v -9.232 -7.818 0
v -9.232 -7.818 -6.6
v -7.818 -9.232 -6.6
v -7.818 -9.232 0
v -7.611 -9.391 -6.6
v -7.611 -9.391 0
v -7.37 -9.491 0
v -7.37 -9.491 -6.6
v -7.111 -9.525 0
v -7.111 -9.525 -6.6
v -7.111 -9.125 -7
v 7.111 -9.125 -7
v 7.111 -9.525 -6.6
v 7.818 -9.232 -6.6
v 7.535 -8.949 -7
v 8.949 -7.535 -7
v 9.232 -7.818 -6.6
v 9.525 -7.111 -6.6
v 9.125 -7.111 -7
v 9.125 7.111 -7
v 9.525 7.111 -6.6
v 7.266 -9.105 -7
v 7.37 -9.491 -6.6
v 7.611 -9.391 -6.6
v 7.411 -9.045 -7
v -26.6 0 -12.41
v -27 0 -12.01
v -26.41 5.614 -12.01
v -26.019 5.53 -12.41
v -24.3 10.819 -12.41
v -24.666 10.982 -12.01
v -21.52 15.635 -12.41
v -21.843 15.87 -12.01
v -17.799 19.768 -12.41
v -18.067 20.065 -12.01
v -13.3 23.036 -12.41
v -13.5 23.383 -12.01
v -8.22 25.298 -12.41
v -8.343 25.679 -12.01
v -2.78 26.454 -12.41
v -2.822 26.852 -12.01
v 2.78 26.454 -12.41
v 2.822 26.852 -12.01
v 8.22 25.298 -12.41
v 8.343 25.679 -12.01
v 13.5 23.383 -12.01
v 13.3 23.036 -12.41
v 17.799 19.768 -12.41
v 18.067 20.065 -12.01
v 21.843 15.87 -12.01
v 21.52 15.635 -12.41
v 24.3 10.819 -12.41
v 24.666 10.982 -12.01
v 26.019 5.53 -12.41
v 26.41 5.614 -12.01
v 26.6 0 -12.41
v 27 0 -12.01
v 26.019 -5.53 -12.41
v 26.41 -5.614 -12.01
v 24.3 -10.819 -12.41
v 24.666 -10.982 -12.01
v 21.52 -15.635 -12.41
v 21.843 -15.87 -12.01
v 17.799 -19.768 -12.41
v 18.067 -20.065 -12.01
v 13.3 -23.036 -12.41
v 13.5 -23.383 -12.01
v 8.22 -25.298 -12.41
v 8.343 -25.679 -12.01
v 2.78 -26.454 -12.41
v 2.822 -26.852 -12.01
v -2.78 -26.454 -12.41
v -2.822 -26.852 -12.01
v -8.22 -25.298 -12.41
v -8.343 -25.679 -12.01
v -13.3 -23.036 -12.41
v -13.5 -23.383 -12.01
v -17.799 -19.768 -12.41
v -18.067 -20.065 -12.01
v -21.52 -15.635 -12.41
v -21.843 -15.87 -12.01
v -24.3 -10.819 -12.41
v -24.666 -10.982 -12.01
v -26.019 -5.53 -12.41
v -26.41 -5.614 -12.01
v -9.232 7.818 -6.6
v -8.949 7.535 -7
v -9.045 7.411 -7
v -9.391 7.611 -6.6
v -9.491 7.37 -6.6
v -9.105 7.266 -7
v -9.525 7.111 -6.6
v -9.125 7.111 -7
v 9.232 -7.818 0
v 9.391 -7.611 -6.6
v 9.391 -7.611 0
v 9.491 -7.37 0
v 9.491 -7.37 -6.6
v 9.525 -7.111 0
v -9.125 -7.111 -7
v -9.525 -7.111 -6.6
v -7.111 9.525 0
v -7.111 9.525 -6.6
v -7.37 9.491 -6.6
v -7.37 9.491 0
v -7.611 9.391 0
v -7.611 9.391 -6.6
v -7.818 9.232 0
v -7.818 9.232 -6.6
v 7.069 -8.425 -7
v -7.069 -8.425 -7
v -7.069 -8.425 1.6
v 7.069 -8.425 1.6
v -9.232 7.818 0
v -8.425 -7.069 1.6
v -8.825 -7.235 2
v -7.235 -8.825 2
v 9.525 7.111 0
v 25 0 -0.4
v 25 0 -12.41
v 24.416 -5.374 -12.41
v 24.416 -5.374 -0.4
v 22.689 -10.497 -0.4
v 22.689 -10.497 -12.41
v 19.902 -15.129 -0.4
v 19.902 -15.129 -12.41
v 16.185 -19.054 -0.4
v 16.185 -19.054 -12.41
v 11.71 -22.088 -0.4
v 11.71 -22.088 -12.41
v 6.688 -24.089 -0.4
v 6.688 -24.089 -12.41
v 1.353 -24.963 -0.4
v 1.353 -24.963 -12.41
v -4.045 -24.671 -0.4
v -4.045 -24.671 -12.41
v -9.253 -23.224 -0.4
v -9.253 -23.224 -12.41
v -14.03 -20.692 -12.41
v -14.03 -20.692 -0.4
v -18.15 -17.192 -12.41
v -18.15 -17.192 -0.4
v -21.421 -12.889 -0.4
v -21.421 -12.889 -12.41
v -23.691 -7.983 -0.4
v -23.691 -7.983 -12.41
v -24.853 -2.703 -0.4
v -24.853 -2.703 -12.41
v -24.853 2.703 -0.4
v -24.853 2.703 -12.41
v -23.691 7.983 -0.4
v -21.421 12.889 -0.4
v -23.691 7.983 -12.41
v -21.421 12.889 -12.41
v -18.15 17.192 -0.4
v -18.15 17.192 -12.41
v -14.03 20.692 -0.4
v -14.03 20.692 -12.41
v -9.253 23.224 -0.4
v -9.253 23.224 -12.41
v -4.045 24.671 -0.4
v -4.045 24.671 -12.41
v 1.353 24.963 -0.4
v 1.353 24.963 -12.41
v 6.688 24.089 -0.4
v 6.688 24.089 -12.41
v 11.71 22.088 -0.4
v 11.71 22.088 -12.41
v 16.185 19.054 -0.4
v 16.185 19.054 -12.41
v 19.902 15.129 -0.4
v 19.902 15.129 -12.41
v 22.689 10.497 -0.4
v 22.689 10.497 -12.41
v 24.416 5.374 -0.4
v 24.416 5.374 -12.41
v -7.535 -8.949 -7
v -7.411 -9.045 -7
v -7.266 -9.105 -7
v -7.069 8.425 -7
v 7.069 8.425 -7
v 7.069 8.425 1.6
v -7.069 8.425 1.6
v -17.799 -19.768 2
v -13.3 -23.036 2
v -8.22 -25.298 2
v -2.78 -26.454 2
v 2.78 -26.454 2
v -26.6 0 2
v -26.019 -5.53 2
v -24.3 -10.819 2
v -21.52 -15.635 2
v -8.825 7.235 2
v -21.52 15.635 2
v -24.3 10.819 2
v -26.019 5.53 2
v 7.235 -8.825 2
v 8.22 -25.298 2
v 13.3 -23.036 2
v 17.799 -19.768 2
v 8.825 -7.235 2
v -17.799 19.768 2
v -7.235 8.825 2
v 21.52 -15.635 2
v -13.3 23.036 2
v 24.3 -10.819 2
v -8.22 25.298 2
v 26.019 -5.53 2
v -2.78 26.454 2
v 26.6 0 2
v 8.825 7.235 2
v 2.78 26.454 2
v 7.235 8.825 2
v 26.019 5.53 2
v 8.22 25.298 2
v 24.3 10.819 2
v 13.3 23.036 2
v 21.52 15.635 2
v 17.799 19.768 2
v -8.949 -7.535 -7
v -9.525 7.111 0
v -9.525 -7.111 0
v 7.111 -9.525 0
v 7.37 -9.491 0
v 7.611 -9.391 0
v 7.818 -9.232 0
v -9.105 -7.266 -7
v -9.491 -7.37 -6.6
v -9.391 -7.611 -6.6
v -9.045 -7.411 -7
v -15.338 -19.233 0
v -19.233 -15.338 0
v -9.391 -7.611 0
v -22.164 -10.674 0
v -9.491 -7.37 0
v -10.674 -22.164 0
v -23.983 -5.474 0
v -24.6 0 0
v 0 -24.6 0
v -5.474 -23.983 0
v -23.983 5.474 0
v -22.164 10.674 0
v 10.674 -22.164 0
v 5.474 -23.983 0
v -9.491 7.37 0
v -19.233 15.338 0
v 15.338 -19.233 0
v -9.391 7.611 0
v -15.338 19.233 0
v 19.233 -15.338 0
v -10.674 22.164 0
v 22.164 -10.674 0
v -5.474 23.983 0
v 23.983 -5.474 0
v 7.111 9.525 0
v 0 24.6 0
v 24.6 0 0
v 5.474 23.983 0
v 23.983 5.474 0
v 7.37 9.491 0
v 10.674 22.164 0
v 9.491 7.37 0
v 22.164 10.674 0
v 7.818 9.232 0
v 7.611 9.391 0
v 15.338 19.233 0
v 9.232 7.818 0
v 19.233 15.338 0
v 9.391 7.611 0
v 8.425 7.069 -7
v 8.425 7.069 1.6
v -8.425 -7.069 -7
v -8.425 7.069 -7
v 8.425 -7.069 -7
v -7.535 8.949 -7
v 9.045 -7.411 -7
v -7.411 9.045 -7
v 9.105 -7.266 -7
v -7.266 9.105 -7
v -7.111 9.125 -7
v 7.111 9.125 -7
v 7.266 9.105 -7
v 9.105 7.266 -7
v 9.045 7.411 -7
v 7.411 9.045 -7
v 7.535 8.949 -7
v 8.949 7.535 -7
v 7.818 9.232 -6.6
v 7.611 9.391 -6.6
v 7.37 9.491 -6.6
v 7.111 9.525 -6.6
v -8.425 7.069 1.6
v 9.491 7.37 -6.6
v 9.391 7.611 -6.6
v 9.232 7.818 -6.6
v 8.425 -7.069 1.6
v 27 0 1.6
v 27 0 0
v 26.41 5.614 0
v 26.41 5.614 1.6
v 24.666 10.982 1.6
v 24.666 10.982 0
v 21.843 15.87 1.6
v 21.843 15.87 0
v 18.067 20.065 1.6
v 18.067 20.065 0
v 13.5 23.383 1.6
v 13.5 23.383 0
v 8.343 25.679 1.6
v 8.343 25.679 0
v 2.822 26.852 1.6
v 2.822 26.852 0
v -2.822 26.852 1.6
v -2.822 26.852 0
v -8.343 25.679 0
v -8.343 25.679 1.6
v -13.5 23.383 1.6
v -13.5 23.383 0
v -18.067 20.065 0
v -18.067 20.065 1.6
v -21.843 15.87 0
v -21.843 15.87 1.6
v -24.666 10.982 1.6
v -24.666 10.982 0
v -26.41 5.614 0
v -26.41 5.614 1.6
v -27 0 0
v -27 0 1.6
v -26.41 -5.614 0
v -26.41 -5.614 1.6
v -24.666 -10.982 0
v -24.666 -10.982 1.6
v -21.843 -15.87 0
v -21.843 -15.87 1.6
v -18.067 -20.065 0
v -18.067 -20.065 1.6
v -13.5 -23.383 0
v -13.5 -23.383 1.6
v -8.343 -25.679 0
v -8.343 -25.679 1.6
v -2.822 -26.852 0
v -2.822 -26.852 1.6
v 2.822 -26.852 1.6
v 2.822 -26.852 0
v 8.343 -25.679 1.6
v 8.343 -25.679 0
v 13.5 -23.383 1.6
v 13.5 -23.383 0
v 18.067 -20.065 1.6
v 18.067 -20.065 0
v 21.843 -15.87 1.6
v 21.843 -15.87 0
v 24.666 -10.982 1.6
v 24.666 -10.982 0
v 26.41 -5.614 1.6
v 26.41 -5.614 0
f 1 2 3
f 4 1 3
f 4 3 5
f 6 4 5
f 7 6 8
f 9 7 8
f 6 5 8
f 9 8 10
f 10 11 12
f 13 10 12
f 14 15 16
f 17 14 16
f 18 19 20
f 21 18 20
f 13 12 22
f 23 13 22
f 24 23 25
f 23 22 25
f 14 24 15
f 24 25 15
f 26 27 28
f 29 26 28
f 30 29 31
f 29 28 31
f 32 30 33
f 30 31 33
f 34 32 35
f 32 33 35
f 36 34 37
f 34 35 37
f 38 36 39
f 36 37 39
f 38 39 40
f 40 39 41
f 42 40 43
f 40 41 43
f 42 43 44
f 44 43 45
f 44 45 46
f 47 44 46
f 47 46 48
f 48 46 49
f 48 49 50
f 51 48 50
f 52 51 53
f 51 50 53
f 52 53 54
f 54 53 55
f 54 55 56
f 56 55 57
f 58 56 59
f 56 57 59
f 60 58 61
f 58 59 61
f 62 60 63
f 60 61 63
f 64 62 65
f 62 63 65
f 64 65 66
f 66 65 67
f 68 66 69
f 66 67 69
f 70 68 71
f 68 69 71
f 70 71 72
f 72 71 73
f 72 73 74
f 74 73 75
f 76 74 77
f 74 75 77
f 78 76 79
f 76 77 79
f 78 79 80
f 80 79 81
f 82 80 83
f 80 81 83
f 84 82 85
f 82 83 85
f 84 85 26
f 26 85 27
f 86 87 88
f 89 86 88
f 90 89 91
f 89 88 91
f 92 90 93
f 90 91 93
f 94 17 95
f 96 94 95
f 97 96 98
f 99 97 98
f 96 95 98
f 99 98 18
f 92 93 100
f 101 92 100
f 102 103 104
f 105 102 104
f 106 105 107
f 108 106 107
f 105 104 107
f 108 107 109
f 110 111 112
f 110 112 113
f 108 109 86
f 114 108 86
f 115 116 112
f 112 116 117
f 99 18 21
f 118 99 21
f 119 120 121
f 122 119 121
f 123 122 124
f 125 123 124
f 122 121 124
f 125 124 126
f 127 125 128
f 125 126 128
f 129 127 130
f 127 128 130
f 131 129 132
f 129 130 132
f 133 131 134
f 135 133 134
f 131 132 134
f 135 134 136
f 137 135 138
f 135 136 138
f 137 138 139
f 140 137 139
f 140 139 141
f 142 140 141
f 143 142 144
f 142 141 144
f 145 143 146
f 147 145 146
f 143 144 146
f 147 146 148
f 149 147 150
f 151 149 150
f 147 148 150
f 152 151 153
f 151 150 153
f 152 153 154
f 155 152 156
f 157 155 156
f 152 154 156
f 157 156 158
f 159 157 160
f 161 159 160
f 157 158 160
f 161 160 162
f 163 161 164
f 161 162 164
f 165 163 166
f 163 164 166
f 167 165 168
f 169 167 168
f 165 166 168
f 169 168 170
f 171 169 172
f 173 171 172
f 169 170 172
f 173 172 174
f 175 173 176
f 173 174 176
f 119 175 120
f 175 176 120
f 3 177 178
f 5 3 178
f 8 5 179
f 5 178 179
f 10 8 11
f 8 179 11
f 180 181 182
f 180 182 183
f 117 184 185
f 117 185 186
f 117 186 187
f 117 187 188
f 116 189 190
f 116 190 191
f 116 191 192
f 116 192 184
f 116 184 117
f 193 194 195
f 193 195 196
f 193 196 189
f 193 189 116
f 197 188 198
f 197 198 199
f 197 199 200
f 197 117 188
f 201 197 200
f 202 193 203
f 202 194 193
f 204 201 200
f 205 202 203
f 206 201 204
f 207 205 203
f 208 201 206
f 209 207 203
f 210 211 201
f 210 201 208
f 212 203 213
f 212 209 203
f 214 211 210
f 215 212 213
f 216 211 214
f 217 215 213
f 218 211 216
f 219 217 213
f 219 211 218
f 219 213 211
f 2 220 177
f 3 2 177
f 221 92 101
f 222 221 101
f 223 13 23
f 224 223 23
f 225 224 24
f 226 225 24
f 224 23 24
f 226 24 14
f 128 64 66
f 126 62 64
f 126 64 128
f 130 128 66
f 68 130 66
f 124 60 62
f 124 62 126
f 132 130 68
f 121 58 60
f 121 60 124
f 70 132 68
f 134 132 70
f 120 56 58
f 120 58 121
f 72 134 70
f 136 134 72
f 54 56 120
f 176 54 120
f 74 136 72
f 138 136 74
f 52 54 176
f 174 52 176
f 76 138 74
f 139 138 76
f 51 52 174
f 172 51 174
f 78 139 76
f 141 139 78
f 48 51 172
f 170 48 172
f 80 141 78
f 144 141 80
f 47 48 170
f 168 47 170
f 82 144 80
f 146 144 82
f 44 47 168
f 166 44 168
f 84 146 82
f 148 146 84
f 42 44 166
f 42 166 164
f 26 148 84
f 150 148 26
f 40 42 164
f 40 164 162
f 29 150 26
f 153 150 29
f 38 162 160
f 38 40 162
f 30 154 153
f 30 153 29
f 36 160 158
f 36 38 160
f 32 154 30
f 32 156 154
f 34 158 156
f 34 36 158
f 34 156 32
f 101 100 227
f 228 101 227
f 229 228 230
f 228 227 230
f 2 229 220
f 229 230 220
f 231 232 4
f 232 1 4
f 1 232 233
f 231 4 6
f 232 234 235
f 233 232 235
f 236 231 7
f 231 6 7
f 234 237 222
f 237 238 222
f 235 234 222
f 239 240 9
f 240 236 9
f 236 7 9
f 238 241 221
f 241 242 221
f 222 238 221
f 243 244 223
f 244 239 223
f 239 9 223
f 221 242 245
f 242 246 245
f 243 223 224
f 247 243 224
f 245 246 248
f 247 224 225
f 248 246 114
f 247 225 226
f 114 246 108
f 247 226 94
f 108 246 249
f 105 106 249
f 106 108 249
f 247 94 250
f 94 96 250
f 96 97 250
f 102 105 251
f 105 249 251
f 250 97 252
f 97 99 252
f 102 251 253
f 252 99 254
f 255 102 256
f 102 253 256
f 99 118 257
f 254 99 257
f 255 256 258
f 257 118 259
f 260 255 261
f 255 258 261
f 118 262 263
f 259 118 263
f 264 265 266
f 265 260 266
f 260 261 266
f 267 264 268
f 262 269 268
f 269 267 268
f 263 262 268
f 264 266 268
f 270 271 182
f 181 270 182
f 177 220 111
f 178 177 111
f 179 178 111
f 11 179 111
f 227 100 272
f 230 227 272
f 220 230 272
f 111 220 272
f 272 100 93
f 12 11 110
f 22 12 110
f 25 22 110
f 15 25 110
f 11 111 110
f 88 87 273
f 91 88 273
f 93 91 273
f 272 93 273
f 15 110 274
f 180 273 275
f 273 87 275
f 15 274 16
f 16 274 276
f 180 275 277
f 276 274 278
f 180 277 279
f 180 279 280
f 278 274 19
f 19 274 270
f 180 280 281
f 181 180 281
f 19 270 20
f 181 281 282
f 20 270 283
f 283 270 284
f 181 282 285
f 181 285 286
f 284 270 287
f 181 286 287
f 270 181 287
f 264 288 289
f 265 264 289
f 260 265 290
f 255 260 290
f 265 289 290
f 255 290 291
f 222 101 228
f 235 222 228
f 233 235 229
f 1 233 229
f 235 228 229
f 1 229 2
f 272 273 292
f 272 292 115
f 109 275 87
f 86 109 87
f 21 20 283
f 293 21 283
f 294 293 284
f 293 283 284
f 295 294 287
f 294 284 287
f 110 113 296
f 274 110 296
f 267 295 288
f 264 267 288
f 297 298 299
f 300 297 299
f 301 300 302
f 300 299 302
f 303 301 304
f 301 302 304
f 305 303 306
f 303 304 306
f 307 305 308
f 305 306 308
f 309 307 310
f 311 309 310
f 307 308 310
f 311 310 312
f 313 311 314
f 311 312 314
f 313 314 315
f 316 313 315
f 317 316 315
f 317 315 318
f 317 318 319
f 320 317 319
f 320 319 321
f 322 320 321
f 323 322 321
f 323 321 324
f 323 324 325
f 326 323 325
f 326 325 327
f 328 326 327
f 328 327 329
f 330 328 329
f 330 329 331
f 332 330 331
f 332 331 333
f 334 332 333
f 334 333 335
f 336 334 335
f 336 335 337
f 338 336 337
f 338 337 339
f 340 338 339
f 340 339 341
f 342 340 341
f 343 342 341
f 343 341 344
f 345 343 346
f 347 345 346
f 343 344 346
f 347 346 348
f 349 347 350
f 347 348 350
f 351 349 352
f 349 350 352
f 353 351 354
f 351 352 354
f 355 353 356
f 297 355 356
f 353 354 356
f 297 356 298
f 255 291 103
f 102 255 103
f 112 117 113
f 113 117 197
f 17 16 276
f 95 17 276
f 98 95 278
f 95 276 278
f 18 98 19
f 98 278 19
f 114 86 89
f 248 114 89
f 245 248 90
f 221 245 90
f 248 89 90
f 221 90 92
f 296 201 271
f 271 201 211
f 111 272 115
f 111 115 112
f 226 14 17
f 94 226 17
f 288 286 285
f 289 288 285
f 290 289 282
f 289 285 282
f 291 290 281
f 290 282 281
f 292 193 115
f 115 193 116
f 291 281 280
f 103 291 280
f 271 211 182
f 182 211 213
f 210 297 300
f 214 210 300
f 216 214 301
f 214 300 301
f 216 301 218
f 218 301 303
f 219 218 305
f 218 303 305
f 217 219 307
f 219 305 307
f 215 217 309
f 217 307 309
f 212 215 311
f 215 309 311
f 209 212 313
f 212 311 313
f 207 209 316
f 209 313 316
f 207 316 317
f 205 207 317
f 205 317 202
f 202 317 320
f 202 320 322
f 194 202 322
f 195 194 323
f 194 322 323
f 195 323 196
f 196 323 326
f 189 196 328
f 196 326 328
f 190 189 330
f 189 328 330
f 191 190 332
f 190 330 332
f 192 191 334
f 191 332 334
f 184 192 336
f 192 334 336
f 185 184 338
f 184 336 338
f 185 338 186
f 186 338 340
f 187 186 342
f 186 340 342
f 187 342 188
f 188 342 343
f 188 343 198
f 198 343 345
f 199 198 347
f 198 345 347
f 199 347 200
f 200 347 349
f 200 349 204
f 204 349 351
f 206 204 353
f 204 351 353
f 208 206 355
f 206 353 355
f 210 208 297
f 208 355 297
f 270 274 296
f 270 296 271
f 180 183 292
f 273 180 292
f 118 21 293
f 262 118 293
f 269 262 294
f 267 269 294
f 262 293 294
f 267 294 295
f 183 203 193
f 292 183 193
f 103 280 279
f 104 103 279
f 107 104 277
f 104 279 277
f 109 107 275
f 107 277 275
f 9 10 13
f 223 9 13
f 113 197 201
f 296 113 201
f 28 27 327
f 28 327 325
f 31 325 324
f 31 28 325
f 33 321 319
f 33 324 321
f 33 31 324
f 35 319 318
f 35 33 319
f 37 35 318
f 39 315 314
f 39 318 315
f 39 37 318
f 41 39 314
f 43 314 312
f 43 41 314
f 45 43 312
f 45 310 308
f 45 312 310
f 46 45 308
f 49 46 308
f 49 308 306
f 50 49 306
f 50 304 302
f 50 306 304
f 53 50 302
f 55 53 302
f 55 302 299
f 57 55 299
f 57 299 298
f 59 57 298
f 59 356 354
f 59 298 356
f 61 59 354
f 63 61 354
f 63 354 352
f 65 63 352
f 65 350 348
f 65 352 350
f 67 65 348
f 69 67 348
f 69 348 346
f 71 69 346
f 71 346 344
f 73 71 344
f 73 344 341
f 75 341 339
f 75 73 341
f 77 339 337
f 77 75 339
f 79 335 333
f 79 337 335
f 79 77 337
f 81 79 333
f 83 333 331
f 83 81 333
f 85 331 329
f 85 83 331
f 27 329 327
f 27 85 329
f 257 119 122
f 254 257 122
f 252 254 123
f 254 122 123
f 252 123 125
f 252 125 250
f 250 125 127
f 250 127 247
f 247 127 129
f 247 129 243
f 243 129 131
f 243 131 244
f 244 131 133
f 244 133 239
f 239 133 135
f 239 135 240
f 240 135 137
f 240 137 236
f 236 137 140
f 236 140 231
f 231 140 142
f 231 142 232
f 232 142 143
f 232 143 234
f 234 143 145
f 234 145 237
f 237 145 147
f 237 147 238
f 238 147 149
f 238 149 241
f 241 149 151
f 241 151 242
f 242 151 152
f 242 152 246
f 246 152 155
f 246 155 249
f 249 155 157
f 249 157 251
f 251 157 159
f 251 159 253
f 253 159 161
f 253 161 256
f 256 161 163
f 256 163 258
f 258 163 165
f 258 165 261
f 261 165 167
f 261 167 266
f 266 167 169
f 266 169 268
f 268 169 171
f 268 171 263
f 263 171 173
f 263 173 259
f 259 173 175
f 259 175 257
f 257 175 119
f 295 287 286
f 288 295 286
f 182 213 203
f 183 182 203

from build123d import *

# Parameters (mm, degrees)
SKETCH1_R           = 27
BOSS_EXTRUDE1_DEPTH = 2
BOSS_EXTRUDE2_START = 12.41
SKETCH2_R           = 27
SKETCH2_R_2         = 25
BOSS_EXTRUDE2_DEPTH = 12.41
BOSS_EXTRUDE3_START = -9
BOSS_EXTRUDE3_DEPTH = 9
CHAMFER1_SIZE       = 0.4


with BuildPart() as part:
    # Sketch1 → Boss-Extrude1 (new body)
    with BuildSketch(Plane.XY):
        Circle(SKETCH1_R)
        with BuildLine():
            Line((-9.232106781, -7.817893219), (-7.817893219, -9.232106781))
            ThreePointArc((-7.817893219, -9.232106781), (-7.49346987, -9.448879533), (-7.110786438, -9.525))
            Line((-7.110786438, -9.525), (7.110786438, -9.525))
            ThreePointArc((7.110786438, -9.525), (7.49346987, -9.448879533), (7.817893219, -9.232106781))
            Line((7.817893219, -9.232106781), (9.232106781, -7.817893219))
            ThreePointArc((9.232106781, -7.817893219), (9.448879533, -7.49346987), (9.525, -7.110786438))
            Line((9.525, -7.110786438), (9.525, 7.110786438))
            ThreePointArc((9.525, 7.110786438), (9.448879533, 7.49346987), (9.232106781, 7.817893219))
            Line((9.232106781, 7.817893219), (7.817893219, 9.232106781))
            ThreePointArc((7.817893219, 9.232106781), (7.49346987, 9.448879533), (7.110786438, 9.525))
            Line((7.110786438, 9.525), (-7.110786438, 9.525))
            ThreePointArc((-7.110786438, 9.525), (-7.49346987, 9.448879533), (-7.817893219, 9.232106781))
            Line((-7.817893219, 9.232106781), (-9.232106781, 7.817893219))
            ThreePointArc((-9.232106781, 7.817893219), (-9.448879533, 7.49346987), (-9.525, 7.110786438))
            Line((-9.525, 7.110786438), (-9.525, -7.110786438))
            ThreePointArc((-9.525, -7.110786438), (-9.448879533, -7.49346987), (-9.232106781, -7.817893219))
        make_face(mode=Mode.SUBTRACT)
    extrude(amount=BOSS_EXTRUDE1_DEPTH)

    # Sketch2 → Boss-Extrude2 (add)
    with BuildSketch(Plane(origin=(0, 0, 0), x_dir=(-1, 0, 0), z_dir=(0, 0, -1)).offset(BOSS_EXTRUDE2_START)):
        Circle(SKETCH2_R)
        with Locations(Location((0, 0, 0), (0, 0, 180))):
            Circle(SKETCH2_R_2, mode=Mode.SUBTRACT)
    extrude(amount=-BOSS_EXTRUDE2_DEPTH)

    # Sketch3 → Boss-Extrude3 (add)
    with BuildSketch(Plane.XY.offset(2).offset(BOSS_EXTRUDE3_START)):
        with BuildLine():
            Line((-7.110786438, -9.525), (7.110786438, -9.525))
            ThreePointArc((7.110786438, -9.525), (7.49346987, -9.448879533), (7.817893219, -9.232106781))
            Line((7.817893219, -9.232106781), (9.232106781, -7.817893219))
            ThreePointArc((9.232106781, -7.817893219), (9.448879533, -7.49346987), (9.525, -7.110786438))
            Line((9.525, -7.110786438), (9.525, 7.110786438))
            ThreePointArc((9.525, 7.110786438), (9.448879533, 7.49346987), (9.232106781, 7.817893219))
            Line((9.232106781, 7.817893219), (7.817893219, 9.232106781))
            ThreePointArc((7.817893219, 9.232106781), (7.49346987, 9.448879533), (7.110786438, 9.525))
            Line((7.110786438, 9.525), (-7.110786438, 9.525))
            ThreePointArc((-7.110786438, 9.525), (-7.49346987, 9.448879533), (-7.817893219, 9.232106781))
            Line((-7.817893219, 9.232106781), (-9.232106781, 7.817893219))
            ThreePointArc((-9.232106781, 7.817893219), (-9.448879533, 7.49346987), (-9.525, 7.110786438))
            Line((-9.525, 7.110786438), (-9.525, -7.110786438))
            ThreePointArc((-9.525, -7.110786438), (-9.448879533, -7.49346987), (-9.232106781, -7.817893219))
            Line((-9.232106781, -7.817893219), (-7.817893219, -9.232106781))
            ThreePointArc((-7.817893219, -9.232106781), (-7.49346987, -9.448879533), (-7.110786438, -9.525))
        make_face()
        Polygon((-7.069365081, -8.425), (7.069365081, -8.425), (8.425, -7.069365081), (8.425, 7.069365081), (7.069365081, 8.425), (-7.069365081, 8.425), (-8.425, 7.069365081), (-8.425, -7.069365081), align=None, mode=Mode.SUBTRACT)
    extrude(amount=BOSS_EXTRUDE3_DEPTH)

    # Chamfer1
    chamfer1_edges = [part.edges().sort_by_distance(p)[0] for p in [
        (-27, 0, 2),
        (-25, 0, 0),
        (27, 0, -12.41),
        (0, -9.525, -7),
        (7.49346987, -9.448879533, -7),
        (8.525, -8.525, -7),
        (9.448879533, -7.49346987, -7),
        (9.525, 0, -7),
        (9.448879533, 7.49346987, -7),
        (8.525, 8.525, -7),
        (7.49346987, 9.448879533, -7),
        (0, 9.525, -7),
        (-7.49346987, 9.448879533, -7),
        (-8.525, 8.525, -7),
        (-9.448879533, 7.49346987, -7),
        (-8.525, -8.525, -7),
        (-9.525, 0, -7),
        (-7.49346987, -9.448879533, -7),
        (-9.448879533, -7.49346987, -7),
        (-7.747182541, -7.747182541, 2),
        (-8.425, 0, 2),
        (-7.747182541, 7.747182541, 2),
        (0, 8.425, 2),
        (7.747182541, 7.747182541, 2),
        (8.425, 0, 2),
        (7.747182541, -7.747182541, 2),
        (0, -8.425, 2),
    ]]
    chamfer(chamfer1_edges, length=CHAMFER1_SIZE)


solid = part.part
